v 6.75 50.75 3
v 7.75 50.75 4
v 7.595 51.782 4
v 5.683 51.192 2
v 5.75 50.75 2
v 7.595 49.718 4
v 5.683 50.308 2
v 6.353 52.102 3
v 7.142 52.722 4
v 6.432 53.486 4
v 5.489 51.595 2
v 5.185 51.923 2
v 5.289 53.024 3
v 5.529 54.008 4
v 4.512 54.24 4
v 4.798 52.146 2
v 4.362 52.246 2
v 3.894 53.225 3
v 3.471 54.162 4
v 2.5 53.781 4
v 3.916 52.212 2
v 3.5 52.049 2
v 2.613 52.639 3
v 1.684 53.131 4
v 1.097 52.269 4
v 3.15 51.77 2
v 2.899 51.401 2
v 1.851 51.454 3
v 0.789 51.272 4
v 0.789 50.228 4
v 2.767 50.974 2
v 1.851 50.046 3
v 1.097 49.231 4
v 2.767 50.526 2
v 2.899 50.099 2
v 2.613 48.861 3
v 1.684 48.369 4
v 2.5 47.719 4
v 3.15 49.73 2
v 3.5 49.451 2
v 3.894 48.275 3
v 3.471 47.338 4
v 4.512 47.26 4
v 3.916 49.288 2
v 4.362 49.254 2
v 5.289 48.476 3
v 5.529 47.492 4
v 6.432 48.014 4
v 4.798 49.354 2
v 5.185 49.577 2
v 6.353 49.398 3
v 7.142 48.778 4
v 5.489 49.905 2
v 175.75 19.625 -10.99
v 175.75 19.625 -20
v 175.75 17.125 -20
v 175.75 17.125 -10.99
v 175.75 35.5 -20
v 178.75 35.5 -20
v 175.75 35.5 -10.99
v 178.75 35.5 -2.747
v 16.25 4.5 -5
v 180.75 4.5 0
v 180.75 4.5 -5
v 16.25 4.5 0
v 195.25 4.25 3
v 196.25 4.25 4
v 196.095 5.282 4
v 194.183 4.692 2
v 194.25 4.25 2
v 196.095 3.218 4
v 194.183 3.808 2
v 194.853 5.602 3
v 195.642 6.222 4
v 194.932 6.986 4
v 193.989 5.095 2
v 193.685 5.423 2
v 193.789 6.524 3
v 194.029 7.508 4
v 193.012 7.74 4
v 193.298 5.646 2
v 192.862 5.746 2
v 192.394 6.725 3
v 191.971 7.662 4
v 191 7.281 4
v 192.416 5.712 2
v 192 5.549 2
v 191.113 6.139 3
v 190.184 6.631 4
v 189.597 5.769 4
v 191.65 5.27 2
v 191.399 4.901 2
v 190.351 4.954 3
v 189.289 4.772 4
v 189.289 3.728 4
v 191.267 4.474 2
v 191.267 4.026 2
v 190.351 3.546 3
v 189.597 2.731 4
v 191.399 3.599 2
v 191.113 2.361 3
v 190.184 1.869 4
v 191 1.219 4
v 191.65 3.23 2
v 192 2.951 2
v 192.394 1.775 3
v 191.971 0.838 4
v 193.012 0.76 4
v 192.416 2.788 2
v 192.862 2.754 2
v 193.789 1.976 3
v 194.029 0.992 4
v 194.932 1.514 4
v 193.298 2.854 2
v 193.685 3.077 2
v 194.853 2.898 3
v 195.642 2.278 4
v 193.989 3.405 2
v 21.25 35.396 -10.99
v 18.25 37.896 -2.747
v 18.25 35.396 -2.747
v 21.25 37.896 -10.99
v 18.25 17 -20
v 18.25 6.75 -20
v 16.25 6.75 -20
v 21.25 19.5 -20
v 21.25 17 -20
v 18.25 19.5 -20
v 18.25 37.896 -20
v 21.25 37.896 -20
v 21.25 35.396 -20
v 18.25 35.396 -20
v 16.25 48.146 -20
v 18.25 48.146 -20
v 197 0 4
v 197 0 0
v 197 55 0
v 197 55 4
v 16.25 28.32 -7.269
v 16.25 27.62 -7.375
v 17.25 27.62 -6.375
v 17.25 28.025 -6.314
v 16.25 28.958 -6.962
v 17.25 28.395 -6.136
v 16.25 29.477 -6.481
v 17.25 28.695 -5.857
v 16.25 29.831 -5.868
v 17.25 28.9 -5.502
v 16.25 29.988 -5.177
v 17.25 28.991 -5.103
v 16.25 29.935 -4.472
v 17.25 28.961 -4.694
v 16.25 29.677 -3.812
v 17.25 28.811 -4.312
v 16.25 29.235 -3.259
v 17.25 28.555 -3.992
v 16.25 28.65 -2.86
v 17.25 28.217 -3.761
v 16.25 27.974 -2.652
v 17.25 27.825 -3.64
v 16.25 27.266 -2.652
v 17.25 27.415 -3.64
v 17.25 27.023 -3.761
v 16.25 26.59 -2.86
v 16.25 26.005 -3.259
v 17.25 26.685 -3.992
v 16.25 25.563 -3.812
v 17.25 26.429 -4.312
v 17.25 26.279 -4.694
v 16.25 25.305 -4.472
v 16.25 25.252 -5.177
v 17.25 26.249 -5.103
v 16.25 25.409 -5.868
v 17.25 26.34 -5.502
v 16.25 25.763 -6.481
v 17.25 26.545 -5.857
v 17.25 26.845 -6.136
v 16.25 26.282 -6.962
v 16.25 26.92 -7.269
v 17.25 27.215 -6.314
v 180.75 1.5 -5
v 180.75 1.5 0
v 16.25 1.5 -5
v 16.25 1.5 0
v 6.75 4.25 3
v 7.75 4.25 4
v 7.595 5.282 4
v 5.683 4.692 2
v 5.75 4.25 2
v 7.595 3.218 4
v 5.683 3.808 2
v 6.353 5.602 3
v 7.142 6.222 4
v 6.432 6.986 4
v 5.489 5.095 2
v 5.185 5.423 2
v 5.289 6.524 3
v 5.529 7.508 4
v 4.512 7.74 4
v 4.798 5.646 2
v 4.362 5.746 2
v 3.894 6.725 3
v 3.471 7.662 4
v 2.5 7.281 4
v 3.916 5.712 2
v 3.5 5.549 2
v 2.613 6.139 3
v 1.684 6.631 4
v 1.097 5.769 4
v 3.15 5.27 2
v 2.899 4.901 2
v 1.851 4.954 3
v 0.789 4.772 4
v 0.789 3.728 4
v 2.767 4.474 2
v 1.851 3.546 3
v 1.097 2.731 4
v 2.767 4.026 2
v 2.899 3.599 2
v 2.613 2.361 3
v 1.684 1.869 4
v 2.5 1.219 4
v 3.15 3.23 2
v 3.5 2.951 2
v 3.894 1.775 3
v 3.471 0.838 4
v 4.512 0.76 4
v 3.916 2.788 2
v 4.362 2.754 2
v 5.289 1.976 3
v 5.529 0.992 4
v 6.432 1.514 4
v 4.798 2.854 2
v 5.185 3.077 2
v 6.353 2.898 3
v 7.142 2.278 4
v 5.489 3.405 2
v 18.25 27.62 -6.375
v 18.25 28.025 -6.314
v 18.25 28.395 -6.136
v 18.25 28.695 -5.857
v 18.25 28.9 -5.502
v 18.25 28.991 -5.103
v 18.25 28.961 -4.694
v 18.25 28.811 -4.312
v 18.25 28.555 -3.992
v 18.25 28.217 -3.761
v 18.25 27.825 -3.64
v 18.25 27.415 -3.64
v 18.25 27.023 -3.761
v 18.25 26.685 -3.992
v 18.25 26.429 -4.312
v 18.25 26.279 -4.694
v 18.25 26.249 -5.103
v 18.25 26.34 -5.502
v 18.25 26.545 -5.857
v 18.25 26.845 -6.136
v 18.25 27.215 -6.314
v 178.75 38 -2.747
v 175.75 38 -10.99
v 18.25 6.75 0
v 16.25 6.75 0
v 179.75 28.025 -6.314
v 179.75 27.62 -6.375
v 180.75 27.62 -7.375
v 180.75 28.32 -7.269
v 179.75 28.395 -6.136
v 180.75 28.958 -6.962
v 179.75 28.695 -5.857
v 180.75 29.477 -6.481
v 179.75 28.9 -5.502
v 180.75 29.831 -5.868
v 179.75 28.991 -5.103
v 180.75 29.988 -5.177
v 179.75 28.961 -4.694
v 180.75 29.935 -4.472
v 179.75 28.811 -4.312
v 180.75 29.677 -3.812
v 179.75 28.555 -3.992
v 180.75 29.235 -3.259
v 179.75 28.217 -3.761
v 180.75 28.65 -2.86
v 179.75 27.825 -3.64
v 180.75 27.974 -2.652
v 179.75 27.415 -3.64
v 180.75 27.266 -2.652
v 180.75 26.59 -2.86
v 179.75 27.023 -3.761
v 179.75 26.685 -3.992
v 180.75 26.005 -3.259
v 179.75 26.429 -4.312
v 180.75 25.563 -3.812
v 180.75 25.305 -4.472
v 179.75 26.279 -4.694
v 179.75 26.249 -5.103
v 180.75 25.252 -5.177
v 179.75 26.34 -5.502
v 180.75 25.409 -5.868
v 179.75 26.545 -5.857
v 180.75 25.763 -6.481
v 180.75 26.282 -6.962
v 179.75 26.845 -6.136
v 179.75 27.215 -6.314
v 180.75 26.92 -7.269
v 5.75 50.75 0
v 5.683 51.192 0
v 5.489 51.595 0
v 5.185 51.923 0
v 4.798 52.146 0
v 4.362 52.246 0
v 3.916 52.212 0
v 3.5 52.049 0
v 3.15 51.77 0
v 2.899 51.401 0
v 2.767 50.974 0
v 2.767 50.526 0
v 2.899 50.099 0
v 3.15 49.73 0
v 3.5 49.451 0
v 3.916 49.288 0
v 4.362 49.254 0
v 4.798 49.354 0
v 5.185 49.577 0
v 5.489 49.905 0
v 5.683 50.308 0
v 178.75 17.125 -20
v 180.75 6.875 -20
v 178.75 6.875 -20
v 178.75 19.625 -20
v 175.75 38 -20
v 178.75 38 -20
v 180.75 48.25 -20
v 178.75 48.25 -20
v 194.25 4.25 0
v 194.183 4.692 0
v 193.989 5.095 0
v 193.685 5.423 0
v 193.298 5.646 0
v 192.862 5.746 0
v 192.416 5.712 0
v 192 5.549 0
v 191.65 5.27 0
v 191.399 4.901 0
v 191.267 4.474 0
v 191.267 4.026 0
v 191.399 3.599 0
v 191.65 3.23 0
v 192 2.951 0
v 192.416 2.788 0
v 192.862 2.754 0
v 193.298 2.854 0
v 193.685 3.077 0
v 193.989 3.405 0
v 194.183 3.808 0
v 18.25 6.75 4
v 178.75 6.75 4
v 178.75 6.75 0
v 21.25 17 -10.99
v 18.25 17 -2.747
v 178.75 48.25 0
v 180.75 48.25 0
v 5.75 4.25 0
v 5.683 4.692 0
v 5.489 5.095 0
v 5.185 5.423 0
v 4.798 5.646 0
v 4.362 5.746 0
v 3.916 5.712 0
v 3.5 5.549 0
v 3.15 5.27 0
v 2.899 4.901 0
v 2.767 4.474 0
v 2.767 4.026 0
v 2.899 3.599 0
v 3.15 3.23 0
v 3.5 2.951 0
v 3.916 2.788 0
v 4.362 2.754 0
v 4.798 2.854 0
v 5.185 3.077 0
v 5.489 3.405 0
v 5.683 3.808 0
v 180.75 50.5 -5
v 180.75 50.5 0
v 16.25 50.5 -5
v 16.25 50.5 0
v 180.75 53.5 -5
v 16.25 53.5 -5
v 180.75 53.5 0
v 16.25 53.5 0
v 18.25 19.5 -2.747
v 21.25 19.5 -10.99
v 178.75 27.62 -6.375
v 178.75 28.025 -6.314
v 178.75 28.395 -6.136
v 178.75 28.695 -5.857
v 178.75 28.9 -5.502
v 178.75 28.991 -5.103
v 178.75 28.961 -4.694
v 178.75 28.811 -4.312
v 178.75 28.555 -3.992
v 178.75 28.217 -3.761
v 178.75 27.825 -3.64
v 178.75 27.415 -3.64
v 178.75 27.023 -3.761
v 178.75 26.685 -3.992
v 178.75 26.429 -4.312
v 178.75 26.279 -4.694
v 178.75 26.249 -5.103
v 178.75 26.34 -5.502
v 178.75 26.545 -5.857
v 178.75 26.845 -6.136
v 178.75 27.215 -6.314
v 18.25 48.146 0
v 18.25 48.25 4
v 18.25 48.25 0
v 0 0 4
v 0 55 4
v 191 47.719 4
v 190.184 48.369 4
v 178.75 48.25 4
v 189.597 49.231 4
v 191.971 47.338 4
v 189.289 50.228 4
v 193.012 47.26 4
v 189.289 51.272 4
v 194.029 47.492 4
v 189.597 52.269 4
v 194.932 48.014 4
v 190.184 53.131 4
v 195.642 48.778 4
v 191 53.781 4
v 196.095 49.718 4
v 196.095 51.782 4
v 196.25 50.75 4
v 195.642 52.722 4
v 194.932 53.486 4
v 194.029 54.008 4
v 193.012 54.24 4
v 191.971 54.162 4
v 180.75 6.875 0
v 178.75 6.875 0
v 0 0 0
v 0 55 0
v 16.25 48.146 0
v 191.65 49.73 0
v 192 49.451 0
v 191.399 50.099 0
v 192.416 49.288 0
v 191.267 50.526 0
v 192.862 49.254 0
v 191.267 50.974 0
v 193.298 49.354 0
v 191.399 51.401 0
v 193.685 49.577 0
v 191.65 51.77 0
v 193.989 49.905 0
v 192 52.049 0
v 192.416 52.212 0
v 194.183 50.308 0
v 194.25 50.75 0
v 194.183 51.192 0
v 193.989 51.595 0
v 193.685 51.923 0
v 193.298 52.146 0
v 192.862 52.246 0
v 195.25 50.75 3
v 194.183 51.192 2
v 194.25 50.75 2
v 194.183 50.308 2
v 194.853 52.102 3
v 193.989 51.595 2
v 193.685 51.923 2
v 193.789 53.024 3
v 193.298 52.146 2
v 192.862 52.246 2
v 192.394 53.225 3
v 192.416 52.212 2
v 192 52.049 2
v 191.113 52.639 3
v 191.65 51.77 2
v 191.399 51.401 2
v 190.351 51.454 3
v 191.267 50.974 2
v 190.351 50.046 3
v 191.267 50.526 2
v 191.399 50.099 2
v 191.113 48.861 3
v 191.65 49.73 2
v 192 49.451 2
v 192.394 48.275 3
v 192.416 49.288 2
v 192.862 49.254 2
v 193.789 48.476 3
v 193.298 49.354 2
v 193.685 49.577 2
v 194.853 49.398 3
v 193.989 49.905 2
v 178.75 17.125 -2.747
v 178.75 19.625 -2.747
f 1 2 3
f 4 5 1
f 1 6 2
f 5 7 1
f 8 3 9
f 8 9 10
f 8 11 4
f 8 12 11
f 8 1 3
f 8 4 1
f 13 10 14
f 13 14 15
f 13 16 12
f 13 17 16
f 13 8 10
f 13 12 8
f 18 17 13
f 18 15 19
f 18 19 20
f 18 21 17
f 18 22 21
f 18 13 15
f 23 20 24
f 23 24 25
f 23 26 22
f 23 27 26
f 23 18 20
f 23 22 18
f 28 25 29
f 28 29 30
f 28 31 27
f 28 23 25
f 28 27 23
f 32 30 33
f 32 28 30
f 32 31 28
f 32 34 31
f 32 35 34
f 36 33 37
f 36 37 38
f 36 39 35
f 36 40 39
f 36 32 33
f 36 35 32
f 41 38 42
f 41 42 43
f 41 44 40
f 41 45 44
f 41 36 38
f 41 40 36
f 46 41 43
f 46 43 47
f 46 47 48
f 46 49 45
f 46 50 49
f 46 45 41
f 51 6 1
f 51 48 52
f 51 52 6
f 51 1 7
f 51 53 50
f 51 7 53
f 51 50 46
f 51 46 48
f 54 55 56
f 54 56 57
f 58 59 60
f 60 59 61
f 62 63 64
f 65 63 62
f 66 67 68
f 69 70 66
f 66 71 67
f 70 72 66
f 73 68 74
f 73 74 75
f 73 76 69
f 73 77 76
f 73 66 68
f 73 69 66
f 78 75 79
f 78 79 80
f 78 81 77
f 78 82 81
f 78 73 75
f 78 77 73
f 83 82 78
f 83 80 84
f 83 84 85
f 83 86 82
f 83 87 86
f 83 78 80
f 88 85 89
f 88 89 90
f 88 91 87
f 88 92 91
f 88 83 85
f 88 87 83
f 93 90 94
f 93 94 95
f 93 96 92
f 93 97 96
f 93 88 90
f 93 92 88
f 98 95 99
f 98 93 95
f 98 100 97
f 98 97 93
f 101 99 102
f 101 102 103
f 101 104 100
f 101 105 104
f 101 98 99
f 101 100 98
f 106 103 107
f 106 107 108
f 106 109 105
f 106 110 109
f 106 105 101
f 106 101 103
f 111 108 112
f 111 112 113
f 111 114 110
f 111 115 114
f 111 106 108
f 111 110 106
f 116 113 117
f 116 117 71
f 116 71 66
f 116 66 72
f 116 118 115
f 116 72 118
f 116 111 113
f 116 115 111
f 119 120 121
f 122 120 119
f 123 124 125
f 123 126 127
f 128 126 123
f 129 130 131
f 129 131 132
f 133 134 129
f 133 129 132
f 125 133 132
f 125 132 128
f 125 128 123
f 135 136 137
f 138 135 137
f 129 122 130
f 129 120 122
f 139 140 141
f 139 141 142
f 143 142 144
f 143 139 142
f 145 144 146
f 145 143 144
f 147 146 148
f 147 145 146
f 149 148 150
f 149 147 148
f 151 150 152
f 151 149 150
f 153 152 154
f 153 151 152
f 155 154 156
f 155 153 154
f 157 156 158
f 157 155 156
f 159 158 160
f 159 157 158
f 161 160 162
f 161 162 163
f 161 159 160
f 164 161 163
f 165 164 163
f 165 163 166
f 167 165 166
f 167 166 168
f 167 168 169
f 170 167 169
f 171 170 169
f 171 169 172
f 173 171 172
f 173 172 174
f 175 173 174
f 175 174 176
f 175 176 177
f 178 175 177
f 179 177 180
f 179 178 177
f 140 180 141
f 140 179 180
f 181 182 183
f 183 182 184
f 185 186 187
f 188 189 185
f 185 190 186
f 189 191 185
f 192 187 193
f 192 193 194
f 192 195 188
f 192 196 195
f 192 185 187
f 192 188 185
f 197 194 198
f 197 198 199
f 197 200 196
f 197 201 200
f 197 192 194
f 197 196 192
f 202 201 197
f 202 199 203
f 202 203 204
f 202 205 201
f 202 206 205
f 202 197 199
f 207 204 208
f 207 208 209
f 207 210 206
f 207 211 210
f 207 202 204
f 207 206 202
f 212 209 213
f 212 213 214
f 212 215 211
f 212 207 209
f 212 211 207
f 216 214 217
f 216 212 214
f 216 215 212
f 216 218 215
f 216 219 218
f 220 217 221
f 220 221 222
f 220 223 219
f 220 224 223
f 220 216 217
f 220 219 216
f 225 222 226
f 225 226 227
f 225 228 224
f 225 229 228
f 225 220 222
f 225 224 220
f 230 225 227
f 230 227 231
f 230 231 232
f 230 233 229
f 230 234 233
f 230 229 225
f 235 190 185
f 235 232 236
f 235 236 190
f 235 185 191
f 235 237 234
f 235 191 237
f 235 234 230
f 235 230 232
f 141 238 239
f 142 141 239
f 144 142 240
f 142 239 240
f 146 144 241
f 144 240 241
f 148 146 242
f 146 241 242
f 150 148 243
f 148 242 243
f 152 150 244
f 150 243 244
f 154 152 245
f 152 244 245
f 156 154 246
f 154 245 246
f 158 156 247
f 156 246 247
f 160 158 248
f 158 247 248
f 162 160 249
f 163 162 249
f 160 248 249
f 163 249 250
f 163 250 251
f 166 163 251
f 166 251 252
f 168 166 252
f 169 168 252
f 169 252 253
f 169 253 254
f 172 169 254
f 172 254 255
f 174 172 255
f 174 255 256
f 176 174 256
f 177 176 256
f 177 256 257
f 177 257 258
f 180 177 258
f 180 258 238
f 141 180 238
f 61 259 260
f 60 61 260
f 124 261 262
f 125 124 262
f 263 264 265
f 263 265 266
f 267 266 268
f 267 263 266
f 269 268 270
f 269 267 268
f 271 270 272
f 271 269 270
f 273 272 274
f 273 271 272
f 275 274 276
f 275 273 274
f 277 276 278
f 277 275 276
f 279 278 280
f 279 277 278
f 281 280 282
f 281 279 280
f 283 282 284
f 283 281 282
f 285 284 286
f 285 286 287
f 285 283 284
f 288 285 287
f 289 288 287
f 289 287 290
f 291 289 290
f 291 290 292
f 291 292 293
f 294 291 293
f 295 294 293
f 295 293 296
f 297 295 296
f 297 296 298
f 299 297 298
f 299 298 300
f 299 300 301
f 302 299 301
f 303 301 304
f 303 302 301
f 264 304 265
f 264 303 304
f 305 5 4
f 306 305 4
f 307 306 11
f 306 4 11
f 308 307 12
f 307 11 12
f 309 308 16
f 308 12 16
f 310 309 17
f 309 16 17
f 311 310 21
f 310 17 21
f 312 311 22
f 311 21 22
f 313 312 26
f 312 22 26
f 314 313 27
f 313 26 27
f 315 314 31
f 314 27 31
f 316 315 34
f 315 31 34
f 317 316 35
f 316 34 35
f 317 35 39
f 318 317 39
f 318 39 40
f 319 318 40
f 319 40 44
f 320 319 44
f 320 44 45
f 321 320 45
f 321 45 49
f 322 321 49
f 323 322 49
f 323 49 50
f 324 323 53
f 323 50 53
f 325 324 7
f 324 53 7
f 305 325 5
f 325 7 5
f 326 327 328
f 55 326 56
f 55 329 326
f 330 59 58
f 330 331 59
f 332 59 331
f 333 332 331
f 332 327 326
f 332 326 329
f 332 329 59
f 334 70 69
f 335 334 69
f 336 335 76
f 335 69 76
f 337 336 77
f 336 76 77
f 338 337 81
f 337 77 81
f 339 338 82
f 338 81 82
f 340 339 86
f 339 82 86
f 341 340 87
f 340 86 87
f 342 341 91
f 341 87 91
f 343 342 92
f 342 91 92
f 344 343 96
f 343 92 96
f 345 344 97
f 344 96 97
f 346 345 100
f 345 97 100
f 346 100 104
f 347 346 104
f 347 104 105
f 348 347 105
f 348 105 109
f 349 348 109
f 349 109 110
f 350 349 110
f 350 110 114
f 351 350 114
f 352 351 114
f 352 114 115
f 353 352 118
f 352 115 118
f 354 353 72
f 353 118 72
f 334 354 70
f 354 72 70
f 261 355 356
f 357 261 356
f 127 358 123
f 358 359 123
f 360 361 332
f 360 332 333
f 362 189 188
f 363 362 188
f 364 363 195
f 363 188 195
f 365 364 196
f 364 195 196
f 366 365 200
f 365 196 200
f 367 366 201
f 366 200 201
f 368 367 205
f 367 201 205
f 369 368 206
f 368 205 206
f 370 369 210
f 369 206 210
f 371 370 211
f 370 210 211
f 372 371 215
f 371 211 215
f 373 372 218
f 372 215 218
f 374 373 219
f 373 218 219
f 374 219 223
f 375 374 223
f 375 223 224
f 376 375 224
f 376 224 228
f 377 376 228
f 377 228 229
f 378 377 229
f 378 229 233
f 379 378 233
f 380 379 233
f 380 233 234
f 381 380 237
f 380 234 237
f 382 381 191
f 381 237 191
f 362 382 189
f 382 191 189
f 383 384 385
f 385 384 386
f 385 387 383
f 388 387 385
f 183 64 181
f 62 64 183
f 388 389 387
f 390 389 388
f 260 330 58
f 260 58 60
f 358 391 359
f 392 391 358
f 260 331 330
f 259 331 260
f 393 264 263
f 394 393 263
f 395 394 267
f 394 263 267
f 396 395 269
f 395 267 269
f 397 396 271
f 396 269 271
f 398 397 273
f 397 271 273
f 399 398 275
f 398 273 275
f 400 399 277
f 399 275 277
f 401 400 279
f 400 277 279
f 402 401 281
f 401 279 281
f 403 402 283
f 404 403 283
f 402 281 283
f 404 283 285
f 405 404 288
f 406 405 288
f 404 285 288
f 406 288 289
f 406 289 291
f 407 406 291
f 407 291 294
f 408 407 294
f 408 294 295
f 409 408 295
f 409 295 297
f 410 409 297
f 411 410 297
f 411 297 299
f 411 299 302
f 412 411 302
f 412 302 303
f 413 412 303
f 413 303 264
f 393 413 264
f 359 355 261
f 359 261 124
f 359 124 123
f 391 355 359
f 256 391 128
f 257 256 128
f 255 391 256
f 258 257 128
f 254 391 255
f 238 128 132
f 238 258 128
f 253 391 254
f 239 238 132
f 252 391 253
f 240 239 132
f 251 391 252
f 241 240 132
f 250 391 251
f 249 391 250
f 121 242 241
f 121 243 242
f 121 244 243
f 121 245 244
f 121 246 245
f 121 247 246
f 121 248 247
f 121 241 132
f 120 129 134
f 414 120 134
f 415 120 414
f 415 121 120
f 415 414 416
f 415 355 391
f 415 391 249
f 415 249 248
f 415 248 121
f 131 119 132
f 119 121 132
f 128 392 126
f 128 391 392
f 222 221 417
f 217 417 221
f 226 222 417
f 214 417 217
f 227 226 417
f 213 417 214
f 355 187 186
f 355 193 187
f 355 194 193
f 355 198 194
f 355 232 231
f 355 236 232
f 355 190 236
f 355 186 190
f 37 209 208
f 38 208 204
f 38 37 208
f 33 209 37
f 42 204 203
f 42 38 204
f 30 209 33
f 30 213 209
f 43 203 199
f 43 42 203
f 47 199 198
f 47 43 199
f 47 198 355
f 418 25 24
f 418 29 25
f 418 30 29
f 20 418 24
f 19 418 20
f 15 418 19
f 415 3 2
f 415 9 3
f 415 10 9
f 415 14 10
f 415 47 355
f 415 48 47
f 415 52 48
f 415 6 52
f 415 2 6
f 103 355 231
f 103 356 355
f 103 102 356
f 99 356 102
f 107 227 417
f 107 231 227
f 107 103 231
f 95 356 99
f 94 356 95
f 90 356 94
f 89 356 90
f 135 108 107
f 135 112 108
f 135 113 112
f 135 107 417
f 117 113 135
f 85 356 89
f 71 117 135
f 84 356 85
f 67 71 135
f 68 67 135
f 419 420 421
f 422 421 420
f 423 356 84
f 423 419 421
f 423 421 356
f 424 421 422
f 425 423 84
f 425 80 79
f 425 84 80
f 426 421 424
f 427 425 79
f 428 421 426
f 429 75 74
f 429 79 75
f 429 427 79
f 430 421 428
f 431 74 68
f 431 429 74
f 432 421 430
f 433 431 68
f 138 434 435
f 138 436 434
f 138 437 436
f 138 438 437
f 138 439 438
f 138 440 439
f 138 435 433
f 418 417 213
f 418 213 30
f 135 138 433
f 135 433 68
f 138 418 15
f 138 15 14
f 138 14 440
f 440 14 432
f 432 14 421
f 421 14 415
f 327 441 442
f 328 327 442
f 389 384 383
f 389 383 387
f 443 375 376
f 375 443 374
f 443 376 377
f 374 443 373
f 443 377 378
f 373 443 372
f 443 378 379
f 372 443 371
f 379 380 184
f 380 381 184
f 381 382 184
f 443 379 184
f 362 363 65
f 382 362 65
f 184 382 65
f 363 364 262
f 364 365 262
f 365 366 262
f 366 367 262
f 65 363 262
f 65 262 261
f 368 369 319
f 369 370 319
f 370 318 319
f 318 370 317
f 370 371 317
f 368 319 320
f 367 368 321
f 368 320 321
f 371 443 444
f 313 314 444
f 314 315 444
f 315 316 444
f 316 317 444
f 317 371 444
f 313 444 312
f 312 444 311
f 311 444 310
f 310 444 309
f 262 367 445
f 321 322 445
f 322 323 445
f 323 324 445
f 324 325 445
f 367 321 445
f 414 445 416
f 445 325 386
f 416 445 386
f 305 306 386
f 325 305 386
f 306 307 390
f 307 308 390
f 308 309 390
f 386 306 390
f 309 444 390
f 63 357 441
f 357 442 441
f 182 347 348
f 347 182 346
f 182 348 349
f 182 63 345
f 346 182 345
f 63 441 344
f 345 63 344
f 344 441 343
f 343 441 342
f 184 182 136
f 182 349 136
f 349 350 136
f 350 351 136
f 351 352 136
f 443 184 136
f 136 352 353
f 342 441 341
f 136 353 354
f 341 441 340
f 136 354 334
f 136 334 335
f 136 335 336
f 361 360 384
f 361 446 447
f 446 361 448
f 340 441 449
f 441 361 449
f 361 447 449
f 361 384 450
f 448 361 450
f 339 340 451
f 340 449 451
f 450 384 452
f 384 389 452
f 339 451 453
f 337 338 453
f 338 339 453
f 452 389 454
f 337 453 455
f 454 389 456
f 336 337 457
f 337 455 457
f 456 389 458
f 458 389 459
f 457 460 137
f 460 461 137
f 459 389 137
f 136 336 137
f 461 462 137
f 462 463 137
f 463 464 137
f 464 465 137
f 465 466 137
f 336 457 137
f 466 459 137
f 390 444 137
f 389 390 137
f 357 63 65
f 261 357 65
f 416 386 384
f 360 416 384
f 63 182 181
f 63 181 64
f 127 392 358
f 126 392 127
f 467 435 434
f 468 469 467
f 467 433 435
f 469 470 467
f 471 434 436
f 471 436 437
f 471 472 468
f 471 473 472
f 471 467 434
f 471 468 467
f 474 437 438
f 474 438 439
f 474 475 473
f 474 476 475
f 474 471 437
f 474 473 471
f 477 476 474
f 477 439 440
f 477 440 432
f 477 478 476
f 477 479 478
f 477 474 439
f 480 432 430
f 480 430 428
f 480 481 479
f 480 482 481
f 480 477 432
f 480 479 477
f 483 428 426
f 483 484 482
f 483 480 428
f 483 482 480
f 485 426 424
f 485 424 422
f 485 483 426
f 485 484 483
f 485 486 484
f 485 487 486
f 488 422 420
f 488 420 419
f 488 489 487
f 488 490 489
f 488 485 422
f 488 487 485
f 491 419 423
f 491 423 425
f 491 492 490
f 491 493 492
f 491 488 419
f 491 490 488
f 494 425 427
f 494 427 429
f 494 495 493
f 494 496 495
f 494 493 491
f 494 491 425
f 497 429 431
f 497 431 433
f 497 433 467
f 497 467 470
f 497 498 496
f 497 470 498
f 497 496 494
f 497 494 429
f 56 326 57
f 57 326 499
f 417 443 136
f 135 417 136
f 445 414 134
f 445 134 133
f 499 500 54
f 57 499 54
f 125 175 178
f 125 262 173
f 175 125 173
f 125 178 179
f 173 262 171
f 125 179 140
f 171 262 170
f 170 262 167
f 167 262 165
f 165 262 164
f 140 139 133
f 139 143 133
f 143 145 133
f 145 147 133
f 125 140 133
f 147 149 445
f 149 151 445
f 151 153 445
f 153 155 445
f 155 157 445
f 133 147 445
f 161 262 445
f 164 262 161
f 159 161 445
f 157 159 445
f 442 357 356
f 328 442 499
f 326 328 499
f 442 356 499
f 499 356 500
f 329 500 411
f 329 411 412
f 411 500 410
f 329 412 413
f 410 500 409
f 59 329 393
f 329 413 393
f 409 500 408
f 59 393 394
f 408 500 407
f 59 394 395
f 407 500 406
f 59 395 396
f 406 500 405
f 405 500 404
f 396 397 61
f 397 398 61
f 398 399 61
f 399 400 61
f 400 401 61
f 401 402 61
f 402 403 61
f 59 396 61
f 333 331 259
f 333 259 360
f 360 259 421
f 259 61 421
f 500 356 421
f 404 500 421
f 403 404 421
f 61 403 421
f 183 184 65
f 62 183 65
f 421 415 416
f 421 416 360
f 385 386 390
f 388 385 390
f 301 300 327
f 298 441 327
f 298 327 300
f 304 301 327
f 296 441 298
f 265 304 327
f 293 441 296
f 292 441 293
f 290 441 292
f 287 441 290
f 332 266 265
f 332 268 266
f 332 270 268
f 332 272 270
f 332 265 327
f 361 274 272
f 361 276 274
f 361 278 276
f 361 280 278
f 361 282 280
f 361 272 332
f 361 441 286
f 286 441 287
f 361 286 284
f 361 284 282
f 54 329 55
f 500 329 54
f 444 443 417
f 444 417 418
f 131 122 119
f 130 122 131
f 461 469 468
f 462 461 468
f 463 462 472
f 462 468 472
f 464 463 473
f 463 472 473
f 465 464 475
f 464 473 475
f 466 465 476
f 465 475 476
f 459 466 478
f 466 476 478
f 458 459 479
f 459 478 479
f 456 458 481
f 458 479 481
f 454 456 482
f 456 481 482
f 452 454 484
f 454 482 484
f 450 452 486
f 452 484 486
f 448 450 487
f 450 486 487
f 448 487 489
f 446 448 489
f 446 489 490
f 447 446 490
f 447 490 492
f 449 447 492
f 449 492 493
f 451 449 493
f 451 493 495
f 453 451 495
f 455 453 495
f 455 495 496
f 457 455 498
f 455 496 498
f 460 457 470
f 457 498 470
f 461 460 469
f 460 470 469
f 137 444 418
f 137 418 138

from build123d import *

# Parameters (mm, degrees)
ESQUISSE1_W             = 197
ESQUISSE1_H             = 55
BOSS_EXTRU_1_DEPTH      = 4
ESQUISSE3_R             = 1.5
ENL_V_MAT_EXTRU_2_DEPTH = 4
CHANFREIN1_SIZE         = 2
ESQUISSE4_W             = 160.5
ESQUISSE4_H             = 41.5
ENL_V_MAT_EXTRU_3_DEPTH = 10
ESQUISSE5_W             = 2
ESQUISSE5_H             = 41.395615901
ESQUISSE5_H_2           = 41.375
BOSS_EXTRU_2_DEPTH      = 20
ESQUISSE6_W             = 20
ESQUISSE6_H             = 2.5
BOSS_EXTRU_3_DEPTH      = 3
ESQUISSE7_W             = 20
ESQUISSE7_H             = 2.5
BOSS_EXTRU_4_DEPTH      = 3
CHANFREIN3_SIZE         = 4
CHANFREIN3_SIZE_2       = 10.989909678
ESQUISSE8_R             = 1.375
ENL_V_MAT_EXTRU_4_DEPTH = 900
CHANFREIN4_SIZE         = 1
ESQUISSE9_W             = 164.5
ESQUISSE9_H             = 3
BOSS_EXTRU_5_DEPTH      = 5


with BuildPart() as part:
    # Esquisse1 → Boss.-Extru.1 (new body)
    with BuildSketch(Plane.XY):
        with Locations((98.5, 27.5)):
            Rectangle(ESQUISSE1_W, ESQUISSE1_H)
    extrude(amount=BOSS_EXTRU_1_DEPTH)

    # Esquisse3 → Enlèv. mat.-Extru.2 (cut)
    with BuildSketch(Plane.XY.offset(4)):
        with Locations((4.25, 50.75)):
            Circle(ESQUISSE3_R)
        with Locations((4.25, 4.25)):
            Circle(ESQUISSE3_R)
        with Locations((192.75, 4.25)):
            Circle(ESQUISSE3_R)
        with Locations((192.75, 50.75)):
            Circle(ESQUISSE3_R)
    extrude(amount=-ENL_V_MAT_EXTRU_2_DEPTH, mode=Mode.SUBTRACT)

    # Chanfrein1
    chanfrein1_edges = [part.edges().sort_by_distance(p)[0] for p in [
        (2.75, 50.75, 4),
        (2.75, 4.25, 4),
        (191.25, 4.25, 4),
        (191.25, 50.75, 4),
    ]]
    chamfer(chanfrein1_edges, length=CHANFREIN1_SIZE)

    # Esquisse4 → Enlèv. mat.-Extru.3 (cut)
    with BuildSketch(Plane.XY.offset(4)):
        with Locations((98.5, 27.5)):
            Rectangle(ESQUISSE4_W, ESQUISSE4_H)
    extrude(amount=-ENL_V_MAT_EXTRU_3_DEPTH, mode=Mode.SUBTRACT)

    # Esquisse5 → Boss.-Extru.2 (add)
    with BuildSketch(Plane(origin=(0, 0, 0), x_dir=(-1, 0, 0), z_dir=(0, 0, -1))):
        with Locations((-17.25, 27.447807951)):
            Rectangle(ESQUISSE5_W, ESQUISSE5_H)
        with Locations((-179.75, 27.5625)):
            Rectangle(ESQUISSE5_W, ESQUISSE5_H_2)
    extrude(amount=BOSS_EXTRU_2_DEPTH)

    # Esquisse6 → Boss.-Extru.3 (add)
    with BuildSketch(Plane.ZY.offset(-178.75)):
        with Locations((-10, 18.375)):
            Rectangle(ESQUISSE6_W, ESQUISSE6_H)
        with Locations((-10, 36.75)):
            Rectangle(ESQUISSE6_W, ESQUISSE6_H)
    extrude(amount=BOSS_EXTRU_3_DEPTH)

    # Esquisse7 → Boss.-Extru.4 (add)
    with BuildSketch(Plane(origin=(18.25, 0, 0), x_dir=(0, 0, -1), z_dir=(1, 0, 0))):
        with Locations((10, 18.25)):
            Rectangle(ESQUISSE7_W, ESQUISSE7_H)
        with Locations((10, 36.645615901)):
            Rectangle(ESQUISSE7_W, ESQUISSE7_H)
    extrude(amount=BOSS_EXTRU_4_DEPTH)

    # Chanfrein3
    # the kernel refuses this chamfer: 10.989909678, 4 mm, written as the material it takes off along each edge
    with BuildSketch(Plane(origin=(21.25, 48.009965797, 0), x_dir=(-0.9950833631817486, 0, 0.0990409022520506), z_dir=(0, -1, 0))) as chanfrein3_piece_1_section:
        Polygon((CHANFREIN3_SIZE * 0.995083363182, CHANFREIN3_SIZE * 0.0990409022521), (-CHANFREIN3_SIZE_2 * 0.0990409022504, CHANFREIN3_SIZE_2 * 0.995083363165), (0, 0), align=None)
    chanfrein3_piece_1 = extrude(amount=59.519931595, mode=Mode.PRIVATE)
    chanfrein3_piece_1 = split(chanfrein3_piece_1, bisect_by=Plane(origin=(18.25, 18.25, -4.010147901), z_dir=(1, 0, 0)), keep=Keep.TOP, mode=Mode.PRIVATE)
    add(chanfrein3_piece_1, mode=Mode.SUBTRACT)
    with BuildSketch(Plane(origin=(21.25, 6.885650104, 0), x_dir=(-0.9950833631817486, 0, 0.0990409022520506), z_dir=(0, 1, 0))) as chanfrein3_piece_2_section:
        Polygon((CHANFREIN3_SIZE * 0.995083363182, -CHANFREIN3_SIZE * 0.0990409022521), (-CHANFREIN3_SIZE_2 * 0.0990409022504, -CHANFREIN3_SIZE_2 * 0.995083363165), (0, 0), align=None)
    chanfrein3_piece_2 = extrude(amount=59.519931595, mode=Mode.PRIVATE)
    chanfrein3_piece_2 = split(chanfrein3_piece_2, bisect_by=Plane(origin=(18.25, 36.645615901, -4.010147901), z_dir=(1, 0, 0)), keep=Keep.TOP, mode=Mode.PRIVATE)
    add(chanfrein3_piece_2, mode=Mode.SUBTRACT)
    with BuildSketch(Plane(origin=(175.75, 66.509965797, 0), x_dir=(0.9950833631817486, 0, 0.09904090225205044), z_dir=(0, -1, 0))) as chanfrein3_piece_3_section:
        Polygon((CHANFREIN3_SIZE * 0.995083363182, -CHANFREIN3_SIZE * 0.0990409022521), (-CHANFREIN3_SIZE_2 * 0.0990409022504, -CHANFREIN3_SIZE_2 * 0.995083363165), (0, 0), align=None)
    chanfrein3_piece_3 = extrude(amount=59.519931595, mode=Mode.PRIVATE)
    chanfrein3_piece_3 = split(chanfrein3_piece_3, bisect_by=Plane(origin=(178.75, 36.75, -4.010147901), z_dir=(-1, 0, 0)), keep=Keep.TOP, mode=Mode.PRIVATE)
    add(chanfrein3_piece_3, mode=Mode.SUBTRACT)
    with BuildSketch(Plane(origin=(175.75, 48.134965797, 0), x_dir=(0.9950833631817486, 0, 0.09904090225205044), z_dir=(0, -1, 0))) as chanfrein3_piece_4_section:
        Polygon((CHANFREIN3_SIZE * 0.995083363182, -CHANFREIN3_SIZE * 0.0990409022521), (-CHANFREIN3_SIZE_2 * 0.0990409022504, -CHANFREIN3_SIZE_2 * 0.995083363165), (0, 0), align=None)
    chanfrein3_piece_4 = extrude(amount=59.519931595, mode=Mode.PRIVATE)
    chanfrein3_piece_4 = split(chanfrein3_piece_4, bisect_by=Plane(origin=(178.75, 18.375, -4.010147901), z_dir=(-1, 0, 0)), keep=Keep.TOP, mode=Mode.PRIVATE)
    add(chanfrein3_piece_4, mode=Mode.SUBTRACT)

    # Esquisse8 → Enlèv. mat.-Extru.4 (cut)
    with BuildSketch(Plane(origin=(180.75, 0, 0), x_dir=(0, 0, -1), z_dir=(1, 0, 0))):
        with Locations((5, 27.62)):
            Circle(ESQUISSE8_R)
    extrude(amount=-ENL_V_MAT_EXTRU_4_DEPTH, mode=Mode.SUBTRACT)

    # Chanfrein4
    chanfrein4_edges = [part.edges().sort_by_distance(p)[0] for p in [
        (16.25, 27.62, -3.625),
        (180.75, 27.62, -3.625),
    ]]
    chamfer(chanfrein4_edges, length=CHANFREIN4_SIZE)

    # Esquisse9 → Boss.-Extru.5 (add)
    with BuildSketch(Plane(origin=(0, 0, 0), x_dir=(-1, 0, 0), z_dir=(0, 0, -1))):
        with Locations((-98.5, 52)):
            Rectangle(ESQUISSE9_W, ESQUISSE9_H)
        with Locations((-98.5, 3)):
            Rectangle(ESQUISSE9_W, ESQUISSE9_H)
    extrude(amount=BOSS_EXTRU_5_DEPTH)


solid = part.part
